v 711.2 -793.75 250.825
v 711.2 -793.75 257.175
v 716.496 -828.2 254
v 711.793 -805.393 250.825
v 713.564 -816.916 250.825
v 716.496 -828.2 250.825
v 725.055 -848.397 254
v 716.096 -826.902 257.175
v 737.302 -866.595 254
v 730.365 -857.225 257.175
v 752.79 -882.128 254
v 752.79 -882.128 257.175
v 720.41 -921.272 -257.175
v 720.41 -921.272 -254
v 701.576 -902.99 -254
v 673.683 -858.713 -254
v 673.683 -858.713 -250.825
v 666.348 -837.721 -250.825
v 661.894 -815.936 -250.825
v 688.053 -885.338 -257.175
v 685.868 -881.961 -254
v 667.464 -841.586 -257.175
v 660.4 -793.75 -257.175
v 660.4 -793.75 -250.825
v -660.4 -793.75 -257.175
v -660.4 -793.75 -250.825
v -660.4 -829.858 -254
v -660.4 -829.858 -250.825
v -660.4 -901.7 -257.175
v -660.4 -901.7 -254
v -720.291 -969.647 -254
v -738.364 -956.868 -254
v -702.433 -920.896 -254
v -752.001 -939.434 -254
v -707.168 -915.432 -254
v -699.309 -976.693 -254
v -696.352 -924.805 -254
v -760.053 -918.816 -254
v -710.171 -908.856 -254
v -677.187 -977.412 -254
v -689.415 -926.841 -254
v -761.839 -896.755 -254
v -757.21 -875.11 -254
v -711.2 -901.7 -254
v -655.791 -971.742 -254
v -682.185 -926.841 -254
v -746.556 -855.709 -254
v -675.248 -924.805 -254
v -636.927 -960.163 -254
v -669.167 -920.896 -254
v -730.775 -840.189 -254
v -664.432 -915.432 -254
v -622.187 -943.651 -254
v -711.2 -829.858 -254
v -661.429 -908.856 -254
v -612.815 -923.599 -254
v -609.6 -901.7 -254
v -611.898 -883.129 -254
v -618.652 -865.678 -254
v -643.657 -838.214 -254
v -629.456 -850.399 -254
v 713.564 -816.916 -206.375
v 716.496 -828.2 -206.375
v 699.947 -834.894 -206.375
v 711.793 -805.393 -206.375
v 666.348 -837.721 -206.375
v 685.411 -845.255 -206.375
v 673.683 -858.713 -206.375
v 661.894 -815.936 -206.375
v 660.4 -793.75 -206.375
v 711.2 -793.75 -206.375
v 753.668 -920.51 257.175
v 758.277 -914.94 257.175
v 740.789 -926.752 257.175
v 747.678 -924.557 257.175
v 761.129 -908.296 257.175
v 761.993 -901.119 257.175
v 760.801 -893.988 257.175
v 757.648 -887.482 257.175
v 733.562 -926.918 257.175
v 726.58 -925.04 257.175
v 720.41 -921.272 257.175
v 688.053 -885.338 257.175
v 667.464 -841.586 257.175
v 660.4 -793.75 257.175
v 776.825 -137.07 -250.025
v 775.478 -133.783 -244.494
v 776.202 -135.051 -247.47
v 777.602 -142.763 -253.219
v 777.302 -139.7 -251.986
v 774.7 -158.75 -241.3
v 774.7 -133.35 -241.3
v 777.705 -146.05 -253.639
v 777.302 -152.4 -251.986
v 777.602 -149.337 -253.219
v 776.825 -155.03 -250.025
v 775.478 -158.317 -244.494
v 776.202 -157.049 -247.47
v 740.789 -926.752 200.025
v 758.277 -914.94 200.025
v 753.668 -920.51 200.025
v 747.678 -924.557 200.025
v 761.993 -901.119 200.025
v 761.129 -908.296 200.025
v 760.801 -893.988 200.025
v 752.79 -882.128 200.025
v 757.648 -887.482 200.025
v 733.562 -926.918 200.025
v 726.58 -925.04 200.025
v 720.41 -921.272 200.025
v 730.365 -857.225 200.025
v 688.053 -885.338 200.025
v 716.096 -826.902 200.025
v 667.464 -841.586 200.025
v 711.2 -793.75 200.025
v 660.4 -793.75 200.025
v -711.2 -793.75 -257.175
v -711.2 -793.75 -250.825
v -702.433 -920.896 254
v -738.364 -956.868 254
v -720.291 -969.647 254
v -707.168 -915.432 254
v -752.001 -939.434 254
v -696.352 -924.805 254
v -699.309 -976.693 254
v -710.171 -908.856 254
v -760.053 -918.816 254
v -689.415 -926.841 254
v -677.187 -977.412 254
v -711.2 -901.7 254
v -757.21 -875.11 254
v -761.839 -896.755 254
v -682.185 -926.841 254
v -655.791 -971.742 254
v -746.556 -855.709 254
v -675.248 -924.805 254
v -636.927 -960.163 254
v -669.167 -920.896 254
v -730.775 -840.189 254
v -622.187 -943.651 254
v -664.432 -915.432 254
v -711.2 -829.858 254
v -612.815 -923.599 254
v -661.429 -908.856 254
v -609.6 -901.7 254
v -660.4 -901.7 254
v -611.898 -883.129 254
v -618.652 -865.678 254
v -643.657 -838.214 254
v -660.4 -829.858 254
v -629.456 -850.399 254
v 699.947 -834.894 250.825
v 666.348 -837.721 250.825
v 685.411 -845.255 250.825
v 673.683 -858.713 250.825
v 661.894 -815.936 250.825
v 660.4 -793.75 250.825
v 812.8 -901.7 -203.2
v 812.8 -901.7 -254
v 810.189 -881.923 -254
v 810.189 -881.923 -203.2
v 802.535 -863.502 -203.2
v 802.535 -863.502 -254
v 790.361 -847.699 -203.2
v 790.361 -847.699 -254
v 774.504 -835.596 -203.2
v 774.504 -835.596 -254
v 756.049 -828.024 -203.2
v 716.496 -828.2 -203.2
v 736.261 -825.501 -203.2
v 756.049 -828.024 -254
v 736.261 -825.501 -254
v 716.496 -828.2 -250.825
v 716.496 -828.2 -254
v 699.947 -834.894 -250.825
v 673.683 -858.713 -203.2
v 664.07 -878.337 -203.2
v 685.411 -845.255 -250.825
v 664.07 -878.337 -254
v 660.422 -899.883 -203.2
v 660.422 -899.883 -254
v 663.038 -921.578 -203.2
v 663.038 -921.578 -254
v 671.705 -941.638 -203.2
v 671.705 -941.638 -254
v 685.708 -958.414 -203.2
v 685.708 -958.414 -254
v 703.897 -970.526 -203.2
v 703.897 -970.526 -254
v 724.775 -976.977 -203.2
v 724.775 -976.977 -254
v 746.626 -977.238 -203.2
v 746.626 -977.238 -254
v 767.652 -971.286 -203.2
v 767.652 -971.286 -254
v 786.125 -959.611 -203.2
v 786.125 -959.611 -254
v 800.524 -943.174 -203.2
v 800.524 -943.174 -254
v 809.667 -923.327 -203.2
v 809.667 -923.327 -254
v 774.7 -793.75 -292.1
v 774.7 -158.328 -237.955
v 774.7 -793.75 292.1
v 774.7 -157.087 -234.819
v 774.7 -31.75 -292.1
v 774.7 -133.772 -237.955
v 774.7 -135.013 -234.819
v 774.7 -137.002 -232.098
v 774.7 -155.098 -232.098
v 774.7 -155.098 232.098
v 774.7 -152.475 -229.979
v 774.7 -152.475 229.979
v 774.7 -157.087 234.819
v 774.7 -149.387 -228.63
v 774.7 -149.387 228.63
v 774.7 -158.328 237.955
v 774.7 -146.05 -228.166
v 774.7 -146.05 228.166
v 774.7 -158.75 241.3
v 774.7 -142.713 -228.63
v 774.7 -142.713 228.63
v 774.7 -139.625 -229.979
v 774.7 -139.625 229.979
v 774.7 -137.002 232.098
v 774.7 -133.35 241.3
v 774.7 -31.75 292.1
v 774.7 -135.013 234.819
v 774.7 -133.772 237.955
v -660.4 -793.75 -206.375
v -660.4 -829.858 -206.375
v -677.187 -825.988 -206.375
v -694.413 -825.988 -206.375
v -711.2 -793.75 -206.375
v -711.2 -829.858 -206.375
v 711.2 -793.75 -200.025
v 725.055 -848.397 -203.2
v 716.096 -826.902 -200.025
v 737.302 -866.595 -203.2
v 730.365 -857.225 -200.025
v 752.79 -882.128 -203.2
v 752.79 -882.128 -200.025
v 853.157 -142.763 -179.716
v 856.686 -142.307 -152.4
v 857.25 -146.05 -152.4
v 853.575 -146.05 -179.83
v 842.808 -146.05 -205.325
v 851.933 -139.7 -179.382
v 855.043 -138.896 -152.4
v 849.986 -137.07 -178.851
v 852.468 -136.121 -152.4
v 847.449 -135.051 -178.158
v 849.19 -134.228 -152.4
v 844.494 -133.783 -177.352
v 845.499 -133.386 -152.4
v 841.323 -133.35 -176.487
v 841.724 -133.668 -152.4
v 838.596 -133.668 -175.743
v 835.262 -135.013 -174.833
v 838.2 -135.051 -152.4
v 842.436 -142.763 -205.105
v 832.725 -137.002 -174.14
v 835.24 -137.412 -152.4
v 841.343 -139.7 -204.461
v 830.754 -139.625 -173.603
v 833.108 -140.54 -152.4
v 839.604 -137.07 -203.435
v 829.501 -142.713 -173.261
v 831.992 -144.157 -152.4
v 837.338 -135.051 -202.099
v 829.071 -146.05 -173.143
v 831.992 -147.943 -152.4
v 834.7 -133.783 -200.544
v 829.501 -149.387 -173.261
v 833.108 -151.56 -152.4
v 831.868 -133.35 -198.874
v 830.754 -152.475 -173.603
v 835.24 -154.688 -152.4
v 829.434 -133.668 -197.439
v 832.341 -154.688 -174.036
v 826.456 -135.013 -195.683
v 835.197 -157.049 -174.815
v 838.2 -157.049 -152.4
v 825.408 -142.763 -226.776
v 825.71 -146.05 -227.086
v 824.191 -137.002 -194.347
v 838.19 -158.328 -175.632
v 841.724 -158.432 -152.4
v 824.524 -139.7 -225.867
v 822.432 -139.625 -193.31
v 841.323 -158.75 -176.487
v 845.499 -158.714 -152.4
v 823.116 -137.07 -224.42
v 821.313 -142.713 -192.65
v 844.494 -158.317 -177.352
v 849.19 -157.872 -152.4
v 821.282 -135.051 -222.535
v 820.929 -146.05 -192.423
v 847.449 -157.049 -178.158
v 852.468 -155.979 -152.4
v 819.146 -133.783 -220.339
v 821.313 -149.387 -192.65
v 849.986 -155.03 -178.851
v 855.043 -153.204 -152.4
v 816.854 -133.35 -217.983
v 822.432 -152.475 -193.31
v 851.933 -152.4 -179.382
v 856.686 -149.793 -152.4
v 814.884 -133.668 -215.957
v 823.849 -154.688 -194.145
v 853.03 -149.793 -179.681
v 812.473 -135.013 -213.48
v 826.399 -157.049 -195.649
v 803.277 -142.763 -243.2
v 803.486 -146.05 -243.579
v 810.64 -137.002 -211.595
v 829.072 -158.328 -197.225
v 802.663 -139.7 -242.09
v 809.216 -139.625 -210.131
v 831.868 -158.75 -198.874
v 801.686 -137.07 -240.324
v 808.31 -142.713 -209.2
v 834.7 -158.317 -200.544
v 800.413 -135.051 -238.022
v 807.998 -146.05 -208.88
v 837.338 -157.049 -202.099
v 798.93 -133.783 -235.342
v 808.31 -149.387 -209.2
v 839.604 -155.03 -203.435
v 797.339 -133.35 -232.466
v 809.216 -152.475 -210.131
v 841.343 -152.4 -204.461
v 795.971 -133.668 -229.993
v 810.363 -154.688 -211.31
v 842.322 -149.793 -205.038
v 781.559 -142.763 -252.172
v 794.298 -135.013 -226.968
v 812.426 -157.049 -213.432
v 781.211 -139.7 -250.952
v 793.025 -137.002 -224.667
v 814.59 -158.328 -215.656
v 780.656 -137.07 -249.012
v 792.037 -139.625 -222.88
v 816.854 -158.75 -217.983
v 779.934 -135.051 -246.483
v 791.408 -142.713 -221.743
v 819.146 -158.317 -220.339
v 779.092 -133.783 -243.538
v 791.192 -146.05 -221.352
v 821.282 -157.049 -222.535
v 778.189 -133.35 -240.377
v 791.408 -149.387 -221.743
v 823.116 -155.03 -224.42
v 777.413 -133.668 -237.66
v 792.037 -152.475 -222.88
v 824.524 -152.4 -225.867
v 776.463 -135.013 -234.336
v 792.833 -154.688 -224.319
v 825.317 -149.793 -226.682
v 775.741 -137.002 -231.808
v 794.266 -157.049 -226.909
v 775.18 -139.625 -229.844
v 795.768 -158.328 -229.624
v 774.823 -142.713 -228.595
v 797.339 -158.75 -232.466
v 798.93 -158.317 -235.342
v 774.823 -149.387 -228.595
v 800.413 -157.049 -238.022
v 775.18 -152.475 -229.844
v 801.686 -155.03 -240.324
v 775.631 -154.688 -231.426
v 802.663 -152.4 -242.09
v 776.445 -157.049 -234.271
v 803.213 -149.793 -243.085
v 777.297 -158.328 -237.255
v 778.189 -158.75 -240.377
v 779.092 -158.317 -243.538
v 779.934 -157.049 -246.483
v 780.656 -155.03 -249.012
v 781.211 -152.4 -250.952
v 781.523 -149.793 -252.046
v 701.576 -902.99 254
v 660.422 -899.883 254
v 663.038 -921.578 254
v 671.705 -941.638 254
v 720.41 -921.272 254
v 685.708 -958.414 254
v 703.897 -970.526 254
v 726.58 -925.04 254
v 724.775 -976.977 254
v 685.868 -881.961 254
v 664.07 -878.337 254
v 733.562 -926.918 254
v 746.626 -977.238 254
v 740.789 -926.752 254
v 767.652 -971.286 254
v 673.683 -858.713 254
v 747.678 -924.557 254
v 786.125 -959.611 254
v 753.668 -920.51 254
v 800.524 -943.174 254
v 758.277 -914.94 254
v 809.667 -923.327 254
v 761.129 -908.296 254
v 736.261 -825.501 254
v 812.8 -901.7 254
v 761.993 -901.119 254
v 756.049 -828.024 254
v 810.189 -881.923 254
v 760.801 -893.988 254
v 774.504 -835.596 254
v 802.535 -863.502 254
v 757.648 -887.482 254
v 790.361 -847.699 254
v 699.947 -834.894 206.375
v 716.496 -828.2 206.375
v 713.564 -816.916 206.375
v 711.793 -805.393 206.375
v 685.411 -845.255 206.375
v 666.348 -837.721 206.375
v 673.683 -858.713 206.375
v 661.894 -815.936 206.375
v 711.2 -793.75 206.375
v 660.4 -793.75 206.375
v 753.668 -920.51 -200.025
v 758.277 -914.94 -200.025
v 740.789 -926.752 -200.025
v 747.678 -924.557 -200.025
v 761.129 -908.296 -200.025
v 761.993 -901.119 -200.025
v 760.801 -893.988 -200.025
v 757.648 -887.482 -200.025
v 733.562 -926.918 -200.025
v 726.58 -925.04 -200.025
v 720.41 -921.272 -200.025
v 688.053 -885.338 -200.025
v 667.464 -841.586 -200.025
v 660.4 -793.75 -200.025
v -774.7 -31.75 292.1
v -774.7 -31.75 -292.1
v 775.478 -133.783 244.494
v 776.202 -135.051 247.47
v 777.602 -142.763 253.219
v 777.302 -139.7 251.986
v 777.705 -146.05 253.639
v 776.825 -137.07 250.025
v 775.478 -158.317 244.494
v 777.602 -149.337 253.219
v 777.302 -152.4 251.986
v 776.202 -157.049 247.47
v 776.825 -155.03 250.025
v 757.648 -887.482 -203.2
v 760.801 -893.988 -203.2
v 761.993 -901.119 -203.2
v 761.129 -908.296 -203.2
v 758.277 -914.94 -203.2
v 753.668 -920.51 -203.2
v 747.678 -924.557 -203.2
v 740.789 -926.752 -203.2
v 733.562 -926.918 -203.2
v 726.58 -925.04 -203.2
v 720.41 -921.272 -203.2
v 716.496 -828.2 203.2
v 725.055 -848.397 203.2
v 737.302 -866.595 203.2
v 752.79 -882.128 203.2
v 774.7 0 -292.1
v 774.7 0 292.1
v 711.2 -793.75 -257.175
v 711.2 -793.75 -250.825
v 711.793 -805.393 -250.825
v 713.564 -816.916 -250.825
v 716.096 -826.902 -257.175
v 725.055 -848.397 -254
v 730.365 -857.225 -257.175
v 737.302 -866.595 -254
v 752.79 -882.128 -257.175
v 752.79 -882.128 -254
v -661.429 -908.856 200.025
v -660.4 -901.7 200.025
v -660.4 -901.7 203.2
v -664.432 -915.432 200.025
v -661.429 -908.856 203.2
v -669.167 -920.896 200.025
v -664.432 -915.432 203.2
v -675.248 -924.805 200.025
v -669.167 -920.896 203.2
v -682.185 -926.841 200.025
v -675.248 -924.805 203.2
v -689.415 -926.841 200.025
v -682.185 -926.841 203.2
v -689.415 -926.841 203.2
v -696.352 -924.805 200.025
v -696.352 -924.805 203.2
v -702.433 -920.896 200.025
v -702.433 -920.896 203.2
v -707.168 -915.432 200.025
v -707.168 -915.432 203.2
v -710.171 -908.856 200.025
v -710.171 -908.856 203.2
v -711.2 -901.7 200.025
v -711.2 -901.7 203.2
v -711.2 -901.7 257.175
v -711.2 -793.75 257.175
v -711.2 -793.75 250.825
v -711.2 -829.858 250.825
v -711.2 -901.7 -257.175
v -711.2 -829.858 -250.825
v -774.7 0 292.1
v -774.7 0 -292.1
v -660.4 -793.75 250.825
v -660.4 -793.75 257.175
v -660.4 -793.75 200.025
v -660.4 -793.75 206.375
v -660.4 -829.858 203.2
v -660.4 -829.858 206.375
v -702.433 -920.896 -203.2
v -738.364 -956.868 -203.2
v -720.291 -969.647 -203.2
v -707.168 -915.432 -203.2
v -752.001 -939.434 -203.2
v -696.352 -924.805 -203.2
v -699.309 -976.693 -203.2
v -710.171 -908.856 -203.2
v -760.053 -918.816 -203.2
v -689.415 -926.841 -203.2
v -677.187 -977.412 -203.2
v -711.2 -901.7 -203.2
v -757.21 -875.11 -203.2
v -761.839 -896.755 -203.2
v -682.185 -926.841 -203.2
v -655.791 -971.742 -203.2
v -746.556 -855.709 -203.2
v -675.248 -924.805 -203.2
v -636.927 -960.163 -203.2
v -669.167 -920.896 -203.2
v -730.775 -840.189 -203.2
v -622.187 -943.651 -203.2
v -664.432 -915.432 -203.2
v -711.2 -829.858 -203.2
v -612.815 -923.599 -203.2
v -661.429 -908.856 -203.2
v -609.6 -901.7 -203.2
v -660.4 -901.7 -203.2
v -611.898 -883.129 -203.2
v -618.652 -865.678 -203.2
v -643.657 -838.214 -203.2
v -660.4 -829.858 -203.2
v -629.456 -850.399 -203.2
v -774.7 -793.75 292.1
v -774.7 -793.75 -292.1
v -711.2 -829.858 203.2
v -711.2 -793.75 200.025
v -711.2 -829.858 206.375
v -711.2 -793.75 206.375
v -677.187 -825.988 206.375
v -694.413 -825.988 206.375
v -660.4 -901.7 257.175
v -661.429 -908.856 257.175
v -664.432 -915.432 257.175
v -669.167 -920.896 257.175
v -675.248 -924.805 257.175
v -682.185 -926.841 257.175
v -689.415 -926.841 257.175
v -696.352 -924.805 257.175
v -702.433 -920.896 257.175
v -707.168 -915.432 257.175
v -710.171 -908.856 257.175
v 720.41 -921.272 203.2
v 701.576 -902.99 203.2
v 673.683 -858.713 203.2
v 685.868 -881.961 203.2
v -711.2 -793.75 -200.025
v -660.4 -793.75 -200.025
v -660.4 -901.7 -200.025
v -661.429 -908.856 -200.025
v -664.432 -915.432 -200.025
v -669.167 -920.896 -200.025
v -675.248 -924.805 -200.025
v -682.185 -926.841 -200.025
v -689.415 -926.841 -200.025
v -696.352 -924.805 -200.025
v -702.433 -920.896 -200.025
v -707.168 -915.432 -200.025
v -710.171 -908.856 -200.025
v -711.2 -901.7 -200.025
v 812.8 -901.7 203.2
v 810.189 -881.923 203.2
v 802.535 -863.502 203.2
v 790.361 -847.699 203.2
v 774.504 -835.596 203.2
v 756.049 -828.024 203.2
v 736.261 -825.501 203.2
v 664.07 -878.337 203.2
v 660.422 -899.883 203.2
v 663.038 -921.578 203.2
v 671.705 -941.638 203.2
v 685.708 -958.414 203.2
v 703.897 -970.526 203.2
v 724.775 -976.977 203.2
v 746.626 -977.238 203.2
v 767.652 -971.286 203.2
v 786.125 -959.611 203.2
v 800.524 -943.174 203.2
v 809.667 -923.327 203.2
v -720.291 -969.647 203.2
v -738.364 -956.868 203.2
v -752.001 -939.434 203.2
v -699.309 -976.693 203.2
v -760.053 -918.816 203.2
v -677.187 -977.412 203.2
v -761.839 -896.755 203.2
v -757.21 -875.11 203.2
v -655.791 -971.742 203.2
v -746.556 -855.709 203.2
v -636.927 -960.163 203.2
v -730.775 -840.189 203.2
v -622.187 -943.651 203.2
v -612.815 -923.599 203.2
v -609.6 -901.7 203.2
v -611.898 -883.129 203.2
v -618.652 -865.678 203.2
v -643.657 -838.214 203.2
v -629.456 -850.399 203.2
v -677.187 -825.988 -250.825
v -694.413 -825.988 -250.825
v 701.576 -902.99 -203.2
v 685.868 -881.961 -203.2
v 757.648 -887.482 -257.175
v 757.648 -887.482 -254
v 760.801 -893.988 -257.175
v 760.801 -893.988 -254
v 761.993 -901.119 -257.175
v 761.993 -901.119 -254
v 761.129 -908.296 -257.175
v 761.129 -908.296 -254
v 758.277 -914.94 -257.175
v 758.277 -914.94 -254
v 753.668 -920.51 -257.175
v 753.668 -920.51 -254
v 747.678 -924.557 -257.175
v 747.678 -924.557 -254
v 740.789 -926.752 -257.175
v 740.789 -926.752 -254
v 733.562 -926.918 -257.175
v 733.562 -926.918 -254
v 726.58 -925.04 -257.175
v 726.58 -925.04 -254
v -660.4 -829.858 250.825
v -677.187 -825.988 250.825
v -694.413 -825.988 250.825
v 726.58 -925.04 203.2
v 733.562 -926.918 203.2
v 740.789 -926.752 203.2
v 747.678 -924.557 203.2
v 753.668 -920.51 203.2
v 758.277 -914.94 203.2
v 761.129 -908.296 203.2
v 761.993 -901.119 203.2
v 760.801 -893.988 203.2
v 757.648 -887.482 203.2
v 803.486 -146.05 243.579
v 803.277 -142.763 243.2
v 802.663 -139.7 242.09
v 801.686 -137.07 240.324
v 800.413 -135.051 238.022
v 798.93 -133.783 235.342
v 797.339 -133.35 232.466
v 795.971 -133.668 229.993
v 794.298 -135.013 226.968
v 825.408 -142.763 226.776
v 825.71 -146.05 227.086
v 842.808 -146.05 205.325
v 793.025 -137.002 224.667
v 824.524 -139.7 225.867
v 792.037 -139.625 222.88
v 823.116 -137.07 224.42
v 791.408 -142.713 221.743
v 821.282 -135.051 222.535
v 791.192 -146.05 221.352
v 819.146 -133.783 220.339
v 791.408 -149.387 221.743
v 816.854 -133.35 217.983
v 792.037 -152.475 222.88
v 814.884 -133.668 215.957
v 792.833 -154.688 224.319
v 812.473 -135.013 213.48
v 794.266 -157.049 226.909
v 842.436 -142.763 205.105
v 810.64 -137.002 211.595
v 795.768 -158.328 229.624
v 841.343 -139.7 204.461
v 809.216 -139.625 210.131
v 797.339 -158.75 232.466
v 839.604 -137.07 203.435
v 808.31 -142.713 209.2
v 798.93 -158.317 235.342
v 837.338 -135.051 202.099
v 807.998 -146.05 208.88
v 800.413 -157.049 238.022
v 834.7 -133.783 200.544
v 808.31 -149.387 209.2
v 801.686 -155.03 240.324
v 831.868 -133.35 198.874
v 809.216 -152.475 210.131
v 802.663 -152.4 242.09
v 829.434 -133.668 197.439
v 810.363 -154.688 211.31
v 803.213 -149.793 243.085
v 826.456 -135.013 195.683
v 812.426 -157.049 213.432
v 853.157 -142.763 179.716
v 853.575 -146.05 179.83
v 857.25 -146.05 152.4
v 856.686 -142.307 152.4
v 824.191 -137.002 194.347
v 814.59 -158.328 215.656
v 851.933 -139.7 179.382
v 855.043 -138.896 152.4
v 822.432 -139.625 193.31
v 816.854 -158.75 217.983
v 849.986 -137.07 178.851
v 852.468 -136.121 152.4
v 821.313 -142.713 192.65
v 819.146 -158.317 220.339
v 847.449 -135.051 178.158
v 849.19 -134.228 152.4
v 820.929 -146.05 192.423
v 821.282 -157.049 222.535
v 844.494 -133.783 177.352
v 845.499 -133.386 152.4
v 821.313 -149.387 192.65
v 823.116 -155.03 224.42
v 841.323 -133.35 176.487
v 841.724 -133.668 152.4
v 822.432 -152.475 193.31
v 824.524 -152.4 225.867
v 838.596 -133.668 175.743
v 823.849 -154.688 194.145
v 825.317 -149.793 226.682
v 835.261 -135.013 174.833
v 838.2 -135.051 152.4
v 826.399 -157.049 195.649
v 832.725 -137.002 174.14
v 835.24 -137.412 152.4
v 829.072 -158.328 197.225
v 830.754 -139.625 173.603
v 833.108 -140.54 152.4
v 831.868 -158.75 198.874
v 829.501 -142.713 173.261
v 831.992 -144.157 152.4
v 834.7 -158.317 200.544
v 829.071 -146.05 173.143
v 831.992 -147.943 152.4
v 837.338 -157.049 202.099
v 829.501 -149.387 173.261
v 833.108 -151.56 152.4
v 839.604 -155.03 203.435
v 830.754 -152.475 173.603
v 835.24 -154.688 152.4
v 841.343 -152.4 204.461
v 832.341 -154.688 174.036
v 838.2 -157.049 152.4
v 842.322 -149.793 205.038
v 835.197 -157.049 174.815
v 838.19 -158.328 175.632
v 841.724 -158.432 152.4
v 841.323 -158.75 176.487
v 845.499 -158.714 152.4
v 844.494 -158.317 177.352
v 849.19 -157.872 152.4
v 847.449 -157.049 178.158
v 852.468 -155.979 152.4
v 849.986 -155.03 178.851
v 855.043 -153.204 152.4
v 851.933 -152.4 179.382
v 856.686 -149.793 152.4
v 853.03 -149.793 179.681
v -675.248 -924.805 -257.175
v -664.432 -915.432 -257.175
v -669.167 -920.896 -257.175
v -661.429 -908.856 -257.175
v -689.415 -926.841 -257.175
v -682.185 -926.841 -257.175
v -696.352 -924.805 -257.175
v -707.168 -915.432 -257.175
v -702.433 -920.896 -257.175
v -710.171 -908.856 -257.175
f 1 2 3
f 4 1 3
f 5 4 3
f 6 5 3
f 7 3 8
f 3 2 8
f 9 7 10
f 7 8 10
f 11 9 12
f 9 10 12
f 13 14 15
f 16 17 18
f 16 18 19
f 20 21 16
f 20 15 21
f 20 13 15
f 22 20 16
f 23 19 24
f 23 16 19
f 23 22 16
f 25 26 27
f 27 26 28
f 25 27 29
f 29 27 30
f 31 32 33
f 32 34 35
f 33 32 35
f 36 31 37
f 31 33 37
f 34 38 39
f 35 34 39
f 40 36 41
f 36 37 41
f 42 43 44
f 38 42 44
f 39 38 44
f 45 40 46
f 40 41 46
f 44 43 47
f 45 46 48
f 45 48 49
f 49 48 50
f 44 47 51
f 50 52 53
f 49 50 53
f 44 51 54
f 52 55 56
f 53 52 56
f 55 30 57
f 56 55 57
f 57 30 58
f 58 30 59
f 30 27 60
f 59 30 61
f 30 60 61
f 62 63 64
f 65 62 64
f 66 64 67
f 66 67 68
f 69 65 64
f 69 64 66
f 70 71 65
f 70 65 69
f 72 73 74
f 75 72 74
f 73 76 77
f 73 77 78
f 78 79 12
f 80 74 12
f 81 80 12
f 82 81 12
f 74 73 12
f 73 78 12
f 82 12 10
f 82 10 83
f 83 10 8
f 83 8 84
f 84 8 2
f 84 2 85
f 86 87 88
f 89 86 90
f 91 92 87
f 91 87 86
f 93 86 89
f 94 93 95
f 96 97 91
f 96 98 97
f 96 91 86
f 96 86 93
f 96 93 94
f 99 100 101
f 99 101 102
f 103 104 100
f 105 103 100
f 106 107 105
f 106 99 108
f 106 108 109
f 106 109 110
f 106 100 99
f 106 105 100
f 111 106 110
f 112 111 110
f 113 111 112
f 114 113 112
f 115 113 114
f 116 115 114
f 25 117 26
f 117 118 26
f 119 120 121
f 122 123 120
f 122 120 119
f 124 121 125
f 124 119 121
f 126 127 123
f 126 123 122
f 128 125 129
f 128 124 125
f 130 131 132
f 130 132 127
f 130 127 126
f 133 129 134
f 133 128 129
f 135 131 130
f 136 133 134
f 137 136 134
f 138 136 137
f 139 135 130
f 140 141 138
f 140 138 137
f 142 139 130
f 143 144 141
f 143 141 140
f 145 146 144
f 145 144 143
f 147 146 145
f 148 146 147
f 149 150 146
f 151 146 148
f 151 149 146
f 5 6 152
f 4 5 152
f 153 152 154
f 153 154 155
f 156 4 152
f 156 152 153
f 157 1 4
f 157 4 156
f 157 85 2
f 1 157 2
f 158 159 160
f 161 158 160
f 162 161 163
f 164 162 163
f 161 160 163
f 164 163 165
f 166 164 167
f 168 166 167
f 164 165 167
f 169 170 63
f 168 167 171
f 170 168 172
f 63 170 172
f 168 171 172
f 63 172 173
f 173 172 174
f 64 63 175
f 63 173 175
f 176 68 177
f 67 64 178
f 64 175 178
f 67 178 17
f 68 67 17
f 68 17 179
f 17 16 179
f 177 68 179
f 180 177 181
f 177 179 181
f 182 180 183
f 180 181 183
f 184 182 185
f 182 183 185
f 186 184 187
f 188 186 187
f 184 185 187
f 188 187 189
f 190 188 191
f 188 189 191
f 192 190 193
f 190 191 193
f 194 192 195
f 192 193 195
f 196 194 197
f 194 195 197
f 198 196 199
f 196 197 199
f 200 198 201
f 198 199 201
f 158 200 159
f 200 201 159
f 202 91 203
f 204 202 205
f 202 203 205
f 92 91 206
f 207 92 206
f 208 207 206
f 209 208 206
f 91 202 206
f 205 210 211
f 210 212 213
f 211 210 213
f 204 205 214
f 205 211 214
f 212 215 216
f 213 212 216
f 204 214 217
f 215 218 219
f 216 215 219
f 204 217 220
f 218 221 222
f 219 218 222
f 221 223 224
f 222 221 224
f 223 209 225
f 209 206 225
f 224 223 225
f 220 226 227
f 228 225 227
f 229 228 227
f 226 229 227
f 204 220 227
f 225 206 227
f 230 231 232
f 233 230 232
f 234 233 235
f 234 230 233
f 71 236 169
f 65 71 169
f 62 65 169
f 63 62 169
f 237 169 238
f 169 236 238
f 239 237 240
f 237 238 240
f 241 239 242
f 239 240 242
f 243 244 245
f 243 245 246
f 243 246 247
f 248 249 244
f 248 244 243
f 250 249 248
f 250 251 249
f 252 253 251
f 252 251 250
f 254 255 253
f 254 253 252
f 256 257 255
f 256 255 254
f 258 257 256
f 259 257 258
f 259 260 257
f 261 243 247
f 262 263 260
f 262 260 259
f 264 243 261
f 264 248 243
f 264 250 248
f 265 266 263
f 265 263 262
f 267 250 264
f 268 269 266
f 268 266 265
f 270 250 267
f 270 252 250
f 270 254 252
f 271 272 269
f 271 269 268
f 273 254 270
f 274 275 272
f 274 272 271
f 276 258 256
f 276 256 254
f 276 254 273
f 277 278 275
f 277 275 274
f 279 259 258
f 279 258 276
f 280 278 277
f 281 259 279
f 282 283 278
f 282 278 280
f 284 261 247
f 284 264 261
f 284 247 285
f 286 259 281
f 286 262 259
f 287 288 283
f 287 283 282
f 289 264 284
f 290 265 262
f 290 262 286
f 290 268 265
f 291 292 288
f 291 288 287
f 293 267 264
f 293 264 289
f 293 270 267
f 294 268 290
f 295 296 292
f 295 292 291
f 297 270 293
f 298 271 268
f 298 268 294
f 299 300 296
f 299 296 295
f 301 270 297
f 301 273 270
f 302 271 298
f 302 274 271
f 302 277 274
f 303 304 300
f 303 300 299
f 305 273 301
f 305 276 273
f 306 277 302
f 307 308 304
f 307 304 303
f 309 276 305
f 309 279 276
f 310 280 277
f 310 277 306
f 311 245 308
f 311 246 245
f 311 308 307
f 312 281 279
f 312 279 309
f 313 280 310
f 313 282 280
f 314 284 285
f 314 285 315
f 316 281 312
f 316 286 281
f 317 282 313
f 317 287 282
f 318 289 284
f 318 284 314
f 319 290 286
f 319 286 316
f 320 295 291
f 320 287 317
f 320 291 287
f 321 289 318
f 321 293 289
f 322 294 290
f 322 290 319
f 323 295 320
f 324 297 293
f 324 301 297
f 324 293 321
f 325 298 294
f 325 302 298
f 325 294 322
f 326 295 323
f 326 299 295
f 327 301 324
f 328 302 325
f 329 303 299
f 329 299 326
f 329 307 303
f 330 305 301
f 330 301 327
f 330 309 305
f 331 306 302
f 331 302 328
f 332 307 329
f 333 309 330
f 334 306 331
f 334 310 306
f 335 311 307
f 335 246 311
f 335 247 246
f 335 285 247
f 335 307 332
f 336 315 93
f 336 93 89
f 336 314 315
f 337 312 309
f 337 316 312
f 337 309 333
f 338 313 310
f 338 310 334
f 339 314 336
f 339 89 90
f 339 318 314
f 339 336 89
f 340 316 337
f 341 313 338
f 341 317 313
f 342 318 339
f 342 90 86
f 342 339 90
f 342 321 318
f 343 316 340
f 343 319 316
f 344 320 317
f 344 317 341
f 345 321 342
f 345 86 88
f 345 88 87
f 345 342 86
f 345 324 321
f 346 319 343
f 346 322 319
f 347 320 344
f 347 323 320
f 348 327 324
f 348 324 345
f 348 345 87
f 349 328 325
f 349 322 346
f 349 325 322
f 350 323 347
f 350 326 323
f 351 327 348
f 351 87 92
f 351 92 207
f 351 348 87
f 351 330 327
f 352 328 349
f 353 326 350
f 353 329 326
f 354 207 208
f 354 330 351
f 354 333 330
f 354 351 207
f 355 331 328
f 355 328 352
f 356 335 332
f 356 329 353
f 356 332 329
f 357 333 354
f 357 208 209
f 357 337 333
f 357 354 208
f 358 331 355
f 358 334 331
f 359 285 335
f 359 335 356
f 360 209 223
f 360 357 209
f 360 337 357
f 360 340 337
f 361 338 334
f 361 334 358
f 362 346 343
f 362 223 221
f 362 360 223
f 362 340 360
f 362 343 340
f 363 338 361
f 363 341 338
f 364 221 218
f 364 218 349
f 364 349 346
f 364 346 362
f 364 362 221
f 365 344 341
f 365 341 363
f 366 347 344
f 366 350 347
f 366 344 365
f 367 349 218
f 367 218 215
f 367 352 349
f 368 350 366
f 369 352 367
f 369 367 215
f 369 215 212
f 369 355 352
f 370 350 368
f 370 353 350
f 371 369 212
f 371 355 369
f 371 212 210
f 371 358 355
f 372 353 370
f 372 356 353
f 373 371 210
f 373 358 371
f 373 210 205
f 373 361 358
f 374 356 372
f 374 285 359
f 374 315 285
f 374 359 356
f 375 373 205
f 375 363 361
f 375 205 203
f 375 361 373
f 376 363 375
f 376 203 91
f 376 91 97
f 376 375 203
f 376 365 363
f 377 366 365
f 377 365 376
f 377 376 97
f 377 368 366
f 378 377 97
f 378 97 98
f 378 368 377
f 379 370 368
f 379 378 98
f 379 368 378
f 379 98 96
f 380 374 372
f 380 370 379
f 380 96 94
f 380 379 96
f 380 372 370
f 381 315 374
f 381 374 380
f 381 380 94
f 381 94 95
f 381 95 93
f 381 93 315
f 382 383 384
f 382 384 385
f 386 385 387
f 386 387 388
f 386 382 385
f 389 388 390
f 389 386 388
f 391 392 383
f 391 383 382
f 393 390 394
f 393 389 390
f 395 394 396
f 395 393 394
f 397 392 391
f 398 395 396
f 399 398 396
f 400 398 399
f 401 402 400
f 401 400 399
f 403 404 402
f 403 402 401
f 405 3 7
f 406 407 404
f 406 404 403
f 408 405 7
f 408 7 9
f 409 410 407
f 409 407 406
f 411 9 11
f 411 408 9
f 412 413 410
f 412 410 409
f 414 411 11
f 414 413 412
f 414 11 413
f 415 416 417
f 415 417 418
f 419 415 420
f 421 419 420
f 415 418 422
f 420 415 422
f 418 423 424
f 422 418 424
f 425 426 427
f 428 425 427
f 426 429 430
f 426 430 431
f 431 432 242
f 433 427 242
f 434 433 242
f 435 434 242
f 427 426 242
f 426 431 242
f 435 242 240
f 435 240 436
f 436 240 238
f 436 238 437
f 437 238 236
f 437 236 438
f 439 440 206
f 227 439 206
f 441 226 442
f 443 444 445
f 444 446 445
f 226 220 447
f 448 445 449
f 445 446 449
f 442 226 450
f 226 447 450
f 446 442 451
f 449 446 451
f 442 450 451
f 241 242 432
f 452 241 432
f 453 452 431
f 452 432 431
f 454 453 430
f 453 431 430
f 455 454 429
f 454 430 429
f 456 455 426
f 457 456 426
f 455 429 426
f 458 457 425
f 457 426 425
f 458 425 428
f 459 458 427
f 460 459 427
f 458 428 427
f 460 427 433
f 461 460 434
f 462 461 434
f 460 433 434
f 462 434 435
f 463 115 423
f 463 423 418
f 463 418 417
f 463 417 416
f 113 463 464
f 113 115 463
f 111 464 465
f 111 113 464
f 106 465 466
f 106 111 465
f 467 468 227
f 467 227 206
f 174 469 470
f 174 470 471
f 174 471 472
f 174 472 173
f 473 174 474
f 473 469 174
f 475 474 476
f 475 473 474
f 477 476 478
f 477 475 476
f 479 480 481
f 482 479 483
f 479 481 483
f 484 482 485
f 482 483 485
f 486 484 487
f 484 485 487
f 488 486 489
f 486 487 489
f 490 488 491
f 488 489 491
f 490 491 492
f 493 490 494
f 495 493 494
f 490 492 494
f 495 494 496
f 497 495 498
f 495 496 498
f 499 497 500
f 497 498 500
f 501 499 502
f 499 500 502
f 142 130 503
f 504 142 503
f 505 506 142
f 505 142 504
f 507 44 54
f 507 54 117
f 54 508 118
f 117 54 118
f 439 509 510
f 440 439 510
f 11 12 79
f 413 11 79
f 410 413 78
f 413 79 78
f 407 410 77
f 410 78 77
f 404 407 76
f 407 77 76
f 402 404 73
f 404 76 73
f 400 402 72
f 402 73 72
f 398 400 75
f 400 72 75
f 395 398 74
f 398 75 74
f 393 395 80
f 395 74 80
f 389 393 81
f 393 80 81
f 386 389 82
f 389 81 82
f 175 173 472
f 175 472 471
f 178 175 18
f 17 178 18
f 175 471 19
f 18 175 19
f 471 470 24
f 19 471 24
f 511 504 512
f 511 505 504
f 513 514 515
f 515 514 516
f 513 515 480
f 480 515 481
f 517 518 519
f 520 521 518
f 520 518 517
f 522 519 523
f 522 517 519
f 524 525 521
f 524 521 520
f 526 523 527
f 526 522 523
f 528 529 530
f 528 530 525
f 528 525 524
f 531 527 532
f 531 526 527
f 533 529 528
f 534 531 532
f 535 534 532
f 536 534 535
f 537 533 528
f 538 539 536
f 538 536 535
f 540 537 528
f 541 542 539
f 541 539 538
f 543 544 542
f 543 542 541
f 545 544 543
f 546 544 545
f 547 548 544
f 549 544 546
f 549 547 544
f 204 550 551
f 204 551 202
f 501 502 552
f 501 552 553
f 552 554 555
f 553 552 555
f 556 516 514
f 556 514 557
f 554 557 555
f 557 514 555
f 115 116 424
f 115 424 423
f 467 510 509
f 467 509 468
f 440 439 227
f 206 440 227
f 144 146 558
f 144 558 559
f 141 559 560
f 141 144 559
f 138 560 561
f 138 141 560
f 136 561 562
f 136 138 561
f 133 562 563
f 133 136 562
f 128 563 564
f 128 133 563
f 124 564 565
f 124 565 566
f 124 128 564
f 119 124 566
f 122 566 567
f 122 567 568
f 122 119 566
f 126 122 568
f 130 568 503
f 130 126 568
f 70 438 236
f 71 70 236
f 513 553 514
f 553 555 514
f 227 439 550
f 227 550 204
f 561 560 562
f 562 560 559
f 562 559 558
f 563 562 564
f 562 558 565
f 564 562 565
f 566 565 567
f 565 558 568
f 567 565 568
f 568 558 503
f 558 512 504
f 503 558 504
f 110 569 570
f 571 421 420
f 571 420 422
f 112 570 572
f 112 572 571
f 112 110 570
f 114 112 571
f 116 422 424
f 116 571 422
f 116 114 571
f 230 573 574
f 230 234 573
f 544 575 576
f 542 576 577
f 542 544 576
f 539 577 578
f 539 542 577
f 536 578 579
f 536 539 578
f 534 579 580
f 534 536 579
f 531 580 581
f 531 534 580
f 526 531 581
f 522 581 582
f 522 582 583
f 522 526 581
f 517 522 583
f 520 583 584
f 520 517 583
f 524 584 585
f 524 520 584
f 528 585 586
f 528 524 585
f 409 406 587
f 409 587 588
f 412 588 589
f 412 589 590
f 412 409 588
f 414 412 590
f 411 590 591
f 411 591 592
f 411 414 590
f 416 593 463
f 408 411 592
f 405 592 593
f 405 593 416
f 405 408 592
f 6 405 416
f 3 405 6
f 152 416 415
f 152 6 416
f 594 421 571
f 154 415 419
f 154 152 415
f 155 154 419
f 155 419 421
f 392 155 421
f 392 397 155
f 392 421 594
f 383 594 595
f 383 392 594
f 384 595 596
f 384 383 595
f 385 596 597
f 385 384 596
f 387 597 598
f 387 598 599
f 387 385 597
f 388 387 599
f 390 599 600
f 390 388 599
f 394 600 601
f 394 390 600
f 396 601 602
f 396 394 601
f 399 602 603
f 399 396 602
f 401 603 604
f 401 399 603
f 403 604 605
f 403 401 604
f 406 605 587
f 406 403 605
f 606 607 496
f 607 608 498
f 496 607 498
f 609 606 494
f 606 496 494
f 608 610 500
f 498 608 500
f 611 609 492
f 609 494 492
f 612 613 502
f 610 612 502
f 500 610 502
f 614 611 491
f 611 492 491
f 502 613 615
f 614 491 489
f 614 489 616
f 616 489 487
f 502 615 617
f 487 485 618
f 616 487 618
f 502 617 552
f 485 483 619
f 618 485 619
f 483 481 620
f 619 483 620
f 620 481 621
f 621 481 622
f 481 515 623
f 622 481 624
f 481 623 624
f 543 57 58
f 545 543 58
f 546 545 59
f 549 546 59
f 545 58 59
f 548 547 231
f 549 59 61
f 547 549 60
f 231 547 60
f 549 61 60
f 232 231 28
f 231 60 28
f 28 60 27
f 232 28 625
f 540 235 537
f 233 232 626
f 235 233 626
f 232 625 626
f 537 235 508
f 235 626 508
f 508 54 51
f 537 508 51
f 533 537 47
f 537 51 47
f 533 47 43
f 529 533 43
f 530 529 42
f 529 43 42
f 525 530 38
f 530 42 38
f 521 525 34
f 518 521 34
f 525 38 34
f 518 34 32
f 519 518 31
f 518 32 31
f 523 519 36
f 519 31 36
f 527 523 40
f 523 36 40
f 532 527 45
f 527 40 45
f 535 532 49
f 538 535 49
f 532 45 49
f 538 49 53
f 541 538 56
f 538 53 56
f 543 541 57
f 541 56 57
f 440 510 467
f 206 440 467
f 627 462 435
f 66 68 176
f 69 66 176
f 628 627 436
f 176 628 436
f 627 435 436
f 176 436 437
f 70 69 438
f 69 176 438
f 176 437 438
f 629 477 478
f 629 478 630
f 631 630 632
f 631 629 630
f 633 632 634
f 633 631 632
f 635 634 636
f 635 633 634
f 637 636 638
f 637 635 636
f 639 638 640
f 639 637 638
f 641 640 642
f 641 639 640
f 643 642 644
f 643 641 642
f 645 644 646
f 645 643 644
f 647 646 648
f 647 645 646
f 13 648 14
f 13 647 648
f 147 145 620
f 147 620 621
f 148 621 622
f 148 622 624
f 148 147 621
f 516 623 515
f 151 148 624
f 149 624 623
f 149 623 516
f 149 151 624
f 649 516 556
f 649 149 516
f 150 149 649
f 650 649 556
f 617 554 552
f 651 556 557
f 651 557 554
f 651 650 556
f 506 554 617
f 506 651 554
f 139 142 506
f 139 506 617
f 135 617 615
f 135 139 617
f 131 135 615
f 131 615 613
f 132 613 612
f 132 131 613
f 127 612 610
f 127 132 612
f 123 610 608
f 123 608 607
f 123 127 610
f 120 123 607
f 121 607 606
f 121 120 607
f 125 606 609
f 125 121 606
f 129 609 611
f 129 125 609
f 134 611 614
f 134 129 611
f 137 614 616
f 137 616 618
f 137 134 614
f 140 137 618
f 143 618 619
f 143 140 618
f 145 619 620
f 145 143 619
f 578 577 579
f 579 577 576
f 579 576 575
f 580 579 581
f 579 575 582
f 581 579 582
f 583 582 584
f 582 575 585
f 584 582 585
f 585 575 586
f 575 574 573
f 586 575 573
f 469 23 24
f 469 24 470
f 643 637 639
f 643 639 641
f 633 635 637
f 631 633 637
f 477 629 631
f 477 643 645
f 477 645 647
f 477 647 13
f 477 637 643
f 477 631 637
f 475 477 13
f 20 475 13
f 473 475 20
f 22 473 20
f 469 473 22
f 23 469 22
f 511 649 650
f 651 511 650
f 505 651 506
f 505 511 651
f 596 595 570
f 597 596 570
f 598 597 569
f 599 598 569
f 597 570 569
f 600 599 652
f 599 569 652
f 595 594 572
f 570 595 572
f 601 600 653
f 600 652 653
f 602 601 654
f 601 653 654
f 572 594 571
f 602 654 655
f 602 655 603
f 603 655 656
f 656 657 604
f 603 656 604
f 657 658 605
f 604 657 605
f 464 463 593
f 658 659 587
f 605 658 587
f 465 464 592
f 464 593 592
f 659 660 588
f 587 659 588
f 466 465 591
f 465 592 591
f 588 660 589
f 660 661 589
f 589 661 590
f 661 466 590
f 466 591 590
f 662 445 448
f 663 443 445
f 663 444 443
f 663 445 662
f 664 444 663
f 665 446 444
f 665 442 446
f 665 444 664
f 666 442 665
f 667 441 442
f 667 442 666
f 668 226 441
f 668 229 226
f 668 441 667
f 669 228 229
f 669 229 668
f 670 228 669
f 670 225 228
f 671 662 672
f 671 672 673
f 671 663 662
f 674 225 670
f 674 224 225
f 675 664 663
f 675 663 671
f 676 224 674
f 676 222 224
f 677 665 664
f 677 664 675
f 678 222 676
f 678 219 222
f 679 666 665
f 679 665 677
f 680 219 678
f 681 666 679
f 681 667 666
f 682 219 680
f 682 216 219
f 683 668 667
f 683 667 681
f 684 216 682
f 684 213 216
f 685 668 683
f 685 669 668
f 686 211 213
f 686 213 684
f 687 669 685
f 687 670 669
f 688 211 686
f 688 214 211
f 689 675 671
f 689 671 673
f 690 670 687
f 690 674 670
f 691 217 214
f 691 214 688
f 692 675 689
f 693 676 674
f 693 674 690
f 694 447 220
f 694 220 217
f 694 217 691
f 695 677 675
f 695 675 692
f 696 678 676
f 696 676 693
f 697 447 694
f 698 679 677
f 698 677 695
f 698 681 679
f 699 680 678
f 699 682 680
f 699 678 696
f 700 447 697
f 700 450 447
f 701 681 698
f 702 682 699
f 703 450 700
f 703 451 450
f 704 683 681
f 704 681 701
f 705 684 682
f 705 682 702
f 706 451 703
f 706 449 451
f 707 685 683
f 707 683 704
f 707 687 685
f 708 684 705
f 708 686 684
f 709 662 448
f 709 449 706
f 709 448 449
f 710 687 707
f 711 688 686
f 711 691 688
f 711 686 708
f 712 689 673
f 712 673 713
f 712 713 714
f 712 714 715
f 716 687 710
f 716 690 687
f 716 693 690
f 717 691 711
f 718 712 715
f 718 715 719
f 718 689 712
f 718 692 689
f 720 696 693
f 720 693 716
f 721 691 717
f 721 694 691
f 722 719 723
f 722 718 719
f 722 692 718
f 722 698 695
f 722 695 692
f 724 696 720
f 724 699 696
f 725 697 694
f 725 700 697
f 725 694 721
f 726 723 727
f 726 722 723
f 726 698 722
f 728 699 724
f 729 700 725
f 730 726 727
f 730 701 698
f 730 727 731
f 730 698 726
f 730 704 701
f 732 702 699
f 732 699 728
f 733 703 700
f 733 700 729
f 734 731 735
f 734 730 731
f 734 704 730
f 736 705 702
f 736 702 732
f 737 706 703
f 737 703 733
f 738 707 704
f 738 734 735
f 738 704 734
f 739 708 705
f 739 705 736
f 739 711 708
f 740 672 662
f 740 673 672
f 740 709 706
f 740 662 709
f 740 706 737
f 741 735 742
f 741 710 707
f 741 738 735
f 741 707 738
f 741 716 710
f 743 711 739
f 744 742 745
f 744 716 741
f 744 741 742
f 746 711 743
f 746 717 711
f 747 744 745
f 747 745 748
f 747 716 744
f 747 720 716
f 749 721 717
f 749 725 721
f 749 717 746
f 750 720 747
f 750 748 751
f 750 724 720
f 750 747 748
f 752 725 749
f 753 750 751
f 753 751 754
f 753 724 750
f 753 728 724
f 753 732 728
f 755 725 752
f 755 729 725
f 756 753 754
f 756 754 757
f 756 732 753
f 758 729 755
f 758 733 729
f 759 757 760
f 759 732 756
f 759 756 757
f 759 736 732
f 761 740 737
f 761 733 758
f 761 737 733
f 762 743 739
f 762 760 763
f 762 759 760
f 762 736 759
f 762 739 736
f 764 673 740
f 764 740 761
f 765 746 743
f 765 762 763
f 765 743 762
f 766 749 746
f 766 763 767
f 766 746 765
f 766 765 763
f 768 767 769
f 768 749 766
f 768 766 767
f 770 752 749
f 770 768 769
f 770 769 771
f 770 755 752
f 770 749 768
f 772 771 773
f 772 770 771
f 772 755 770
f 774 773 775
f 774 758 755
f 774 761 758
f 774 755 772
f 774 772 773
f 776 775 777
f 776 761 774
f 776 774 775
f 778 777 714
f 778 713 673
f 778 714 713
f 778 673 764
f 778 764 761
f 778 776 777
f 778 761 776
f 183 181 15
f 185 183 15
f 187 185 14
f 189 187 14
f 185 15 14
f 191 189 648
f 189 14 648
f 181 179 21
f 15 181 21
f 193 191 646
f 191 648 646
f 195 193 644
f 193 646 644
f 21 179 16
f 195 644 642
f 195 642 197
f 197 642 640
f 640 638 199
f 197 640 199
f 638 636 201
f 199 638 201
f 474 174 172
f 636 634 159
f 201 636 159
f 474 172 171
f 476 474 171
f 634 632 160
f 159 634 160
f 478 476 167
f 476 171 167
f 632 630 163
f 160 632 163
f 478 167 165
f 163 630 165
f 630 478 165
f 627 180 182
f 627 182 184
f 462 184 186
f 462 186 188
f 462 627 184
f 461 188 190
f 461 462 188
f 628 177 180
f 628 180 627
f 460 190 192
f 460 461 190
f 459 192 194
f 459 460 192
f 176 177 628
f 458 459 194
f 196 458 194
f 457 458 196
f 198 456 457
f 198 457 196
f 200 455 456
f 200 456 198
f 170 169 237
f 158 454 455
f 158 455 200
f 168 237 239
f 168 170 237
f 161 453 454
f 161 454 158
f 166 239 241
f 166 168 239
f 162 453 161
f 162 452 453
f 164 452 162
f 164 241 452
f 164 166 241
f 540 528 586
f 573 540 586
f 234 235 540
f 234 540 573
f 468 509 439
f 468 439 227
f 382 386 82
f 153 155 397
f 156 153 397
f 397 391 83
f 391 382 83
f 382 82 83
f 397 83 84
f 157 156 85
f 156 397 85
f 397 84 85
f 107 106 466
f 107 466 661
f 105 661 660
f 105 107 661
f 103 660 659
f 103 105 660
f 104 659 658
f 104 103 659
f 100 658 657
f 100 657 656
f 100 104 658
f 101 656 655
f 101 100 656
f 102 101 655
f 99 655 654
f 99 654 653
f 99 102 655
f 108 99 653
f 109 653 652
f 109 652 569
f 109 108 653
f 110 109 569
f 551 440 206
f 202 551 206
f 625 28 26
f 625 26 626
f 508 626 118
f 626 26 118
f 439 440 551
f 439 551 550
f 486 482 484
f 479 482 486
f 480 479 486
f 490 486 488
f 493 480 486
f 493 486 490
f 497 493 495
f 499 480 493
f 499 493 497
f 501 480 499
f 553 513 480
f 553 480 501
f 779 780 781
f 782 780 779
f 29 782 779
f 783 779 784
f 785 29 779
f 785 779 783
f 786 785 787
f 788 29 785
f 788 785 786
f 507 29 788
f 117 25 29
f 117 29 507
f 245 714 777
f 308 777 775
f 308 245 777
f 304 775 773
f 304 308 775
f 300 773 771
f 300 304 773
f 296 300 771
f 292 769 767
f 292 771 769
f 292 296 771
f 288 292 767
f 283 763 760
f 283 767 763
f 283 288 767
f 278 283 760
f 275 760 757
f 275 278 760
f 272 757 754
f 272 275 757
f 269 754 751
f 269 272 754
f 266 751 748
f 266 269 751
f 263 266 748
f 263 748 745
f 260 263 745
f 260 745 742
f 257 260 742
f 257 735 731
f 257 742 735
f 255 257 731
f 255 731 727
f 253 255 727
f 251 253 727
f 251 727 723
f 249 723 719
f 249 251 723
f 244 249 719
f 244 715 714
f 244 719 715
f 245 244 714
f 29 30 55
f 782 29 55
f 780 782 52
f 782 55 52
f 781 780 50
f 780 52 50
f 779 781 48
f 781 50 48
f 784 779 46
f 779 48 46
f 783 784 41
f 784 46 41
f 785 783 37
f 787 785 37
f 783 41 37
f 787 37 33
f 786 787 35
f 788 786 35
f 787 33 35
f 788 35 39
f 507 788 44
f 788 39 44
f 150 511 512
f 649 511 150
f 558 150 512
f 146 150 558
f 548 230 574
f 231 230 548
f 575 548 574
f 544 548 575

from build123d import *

# Parameters (mm, degrees)
SKETCH1_W             = 1549.4
SKETCH1_H             = 584.2
BOSS_EXTRUDE1_DEPTH   = 31.75
SKETCH2_W             = 1549.4
SKETCH2_H             = 584.2
BOSS_EXTRUDE2_DEPTH   = 762
SWEEP1_PROFILE_R      = 12.7
SKETCH13_R            = 76.2
BOSS_EXTRUDE3_DEPTH   = 25.4
BOSS_EXTRUDE3_2_DEPTH = 25.4
BOSS_EXTRUDE4_DEPTH   = 3.175


with BuildPart() as part:
    # Sketch1 → Boss-Extrude1 (new body)
    with BuildSketch(Plane(origin=(0, 0, 0), x_dir=(1, 0, 0), z_dir=(0, 1, 0))):
        Rectangle(SKETCH1_W, SKETCH1_H)
    extrude(amount=-BOSS_EXTRUDE1_DEPTH)


with BuildPart() as body_2:
    # Sketch2 → Boss-Extrude2 (new body)
    with BuildSketch(Plane.XZ.offset(31.75)):
        Rectangle(SKETCH2_W, SKETCH2_H)
    extrude(amount=BOSS_EXTRUDE2_DEPTH)

    # Sweep1: sweep along a path in Sketch3
    with BuildLine(Plane(origin=(0, -146.05, 0), x_dir=(1, 0, 0), z_dir=(0, 1, 0))) as sweep1_path:
        ThreePointArc((774.7, -241.3), (824.998613642, -208.929267862), (844.55, -152.4))
        Line((844.55, -152.4), (844.55, 152.4))
        ThreePointArc((844.55, 152.4), (824.998613642, 208.929267862), (774.7, 241.3))
    # Sweep1 profile (on start of the path) → Sweep1 (sweep)
    with BuildSketch(Plane(origin=(774.7, -146.05, 241.3), x_dir=(0.2365930599369072, 0, 0.9716088328075714), z_dir=(0.9716088328075714, 0, -0.2365930599369072))):
        Circle(SWEEP1_PROFILE_R)
    sweep(path=sweep1_path.line)


with BuildPart() as body_3:
    # Sketch13 → Boss-Extrude3 (new, symmetric)
    with BuildSketch(Plane.XY.offset(228.6)):
        with Locations((736.6, -901.7)):
            Circle(SKETCH13_R)
    extrude(amount=BOSS_EXTRUDE3_DEPTH, both=True)



with BuildPart() as body_4:
    # Sketch13 → Boss-Extrude3 2 (new, symmetric)
    with BuildSketch(Plane.XY.offset(228.6)):
        with Locations((-685.8, -901.7)):
            Circle(SKETCH13_R)
    extrude(amount=BOSS_EXTRUDE3_2_DEPTH, both=True)


with BuildPart() as body_3_1:
    add(body_3.part)

    add(body_4.part)  # Boss-Extrude4 merges body 4
    # Sketch14 → Boss-Extrude4 (add, symmetric)
    with BuildSketch(Plane.XY.offset(254)):
        with BuildLine():
            Line((-711.2, -793.75), (-660.4, -793.75))
            Line((-660.4, -793.75), (-660.4, -901.7))
            ThreePointArc((-660.4, -901.7), (-685.8, -927.1), (-711.2, -901.7))
            Line((-711.2, -901.7), (-711.2, -793.75))
        make_face()
        with BuildLine():
            Line((660.4, -793.75), (711.2, -793.75))
            ThreePointArc((711.2, -793.75), (722.116997416, -842.587589451), (752.7898017, -882.128328612))
            ThreePointArc((752.7898017, -882.128328612), (756.171671388, -917.8898017), (720.4101983, -921.271671388))
            ThreePointArc((720.4101983, -921.271671388), (676.152207344, -864.218078897), (660.4, -793.75))
        make_face()
    boss_extrude4 = extrude(amount=BOSS_EXTRUDE4_DEPTH, both=True)

    # Mirror1: Boss-Extrude4 across plane
    add(boss_extrude4.mirror(Plane.XY.offset(228.6)))


with BuildPart() as body_4_2:
    # Mirror2: mirrored copy
    add(body_3_1.part.mirror(Plane.XY))


solid = Compound([part.part, body_2.part, body_3_1.part, body_4_2.part])
